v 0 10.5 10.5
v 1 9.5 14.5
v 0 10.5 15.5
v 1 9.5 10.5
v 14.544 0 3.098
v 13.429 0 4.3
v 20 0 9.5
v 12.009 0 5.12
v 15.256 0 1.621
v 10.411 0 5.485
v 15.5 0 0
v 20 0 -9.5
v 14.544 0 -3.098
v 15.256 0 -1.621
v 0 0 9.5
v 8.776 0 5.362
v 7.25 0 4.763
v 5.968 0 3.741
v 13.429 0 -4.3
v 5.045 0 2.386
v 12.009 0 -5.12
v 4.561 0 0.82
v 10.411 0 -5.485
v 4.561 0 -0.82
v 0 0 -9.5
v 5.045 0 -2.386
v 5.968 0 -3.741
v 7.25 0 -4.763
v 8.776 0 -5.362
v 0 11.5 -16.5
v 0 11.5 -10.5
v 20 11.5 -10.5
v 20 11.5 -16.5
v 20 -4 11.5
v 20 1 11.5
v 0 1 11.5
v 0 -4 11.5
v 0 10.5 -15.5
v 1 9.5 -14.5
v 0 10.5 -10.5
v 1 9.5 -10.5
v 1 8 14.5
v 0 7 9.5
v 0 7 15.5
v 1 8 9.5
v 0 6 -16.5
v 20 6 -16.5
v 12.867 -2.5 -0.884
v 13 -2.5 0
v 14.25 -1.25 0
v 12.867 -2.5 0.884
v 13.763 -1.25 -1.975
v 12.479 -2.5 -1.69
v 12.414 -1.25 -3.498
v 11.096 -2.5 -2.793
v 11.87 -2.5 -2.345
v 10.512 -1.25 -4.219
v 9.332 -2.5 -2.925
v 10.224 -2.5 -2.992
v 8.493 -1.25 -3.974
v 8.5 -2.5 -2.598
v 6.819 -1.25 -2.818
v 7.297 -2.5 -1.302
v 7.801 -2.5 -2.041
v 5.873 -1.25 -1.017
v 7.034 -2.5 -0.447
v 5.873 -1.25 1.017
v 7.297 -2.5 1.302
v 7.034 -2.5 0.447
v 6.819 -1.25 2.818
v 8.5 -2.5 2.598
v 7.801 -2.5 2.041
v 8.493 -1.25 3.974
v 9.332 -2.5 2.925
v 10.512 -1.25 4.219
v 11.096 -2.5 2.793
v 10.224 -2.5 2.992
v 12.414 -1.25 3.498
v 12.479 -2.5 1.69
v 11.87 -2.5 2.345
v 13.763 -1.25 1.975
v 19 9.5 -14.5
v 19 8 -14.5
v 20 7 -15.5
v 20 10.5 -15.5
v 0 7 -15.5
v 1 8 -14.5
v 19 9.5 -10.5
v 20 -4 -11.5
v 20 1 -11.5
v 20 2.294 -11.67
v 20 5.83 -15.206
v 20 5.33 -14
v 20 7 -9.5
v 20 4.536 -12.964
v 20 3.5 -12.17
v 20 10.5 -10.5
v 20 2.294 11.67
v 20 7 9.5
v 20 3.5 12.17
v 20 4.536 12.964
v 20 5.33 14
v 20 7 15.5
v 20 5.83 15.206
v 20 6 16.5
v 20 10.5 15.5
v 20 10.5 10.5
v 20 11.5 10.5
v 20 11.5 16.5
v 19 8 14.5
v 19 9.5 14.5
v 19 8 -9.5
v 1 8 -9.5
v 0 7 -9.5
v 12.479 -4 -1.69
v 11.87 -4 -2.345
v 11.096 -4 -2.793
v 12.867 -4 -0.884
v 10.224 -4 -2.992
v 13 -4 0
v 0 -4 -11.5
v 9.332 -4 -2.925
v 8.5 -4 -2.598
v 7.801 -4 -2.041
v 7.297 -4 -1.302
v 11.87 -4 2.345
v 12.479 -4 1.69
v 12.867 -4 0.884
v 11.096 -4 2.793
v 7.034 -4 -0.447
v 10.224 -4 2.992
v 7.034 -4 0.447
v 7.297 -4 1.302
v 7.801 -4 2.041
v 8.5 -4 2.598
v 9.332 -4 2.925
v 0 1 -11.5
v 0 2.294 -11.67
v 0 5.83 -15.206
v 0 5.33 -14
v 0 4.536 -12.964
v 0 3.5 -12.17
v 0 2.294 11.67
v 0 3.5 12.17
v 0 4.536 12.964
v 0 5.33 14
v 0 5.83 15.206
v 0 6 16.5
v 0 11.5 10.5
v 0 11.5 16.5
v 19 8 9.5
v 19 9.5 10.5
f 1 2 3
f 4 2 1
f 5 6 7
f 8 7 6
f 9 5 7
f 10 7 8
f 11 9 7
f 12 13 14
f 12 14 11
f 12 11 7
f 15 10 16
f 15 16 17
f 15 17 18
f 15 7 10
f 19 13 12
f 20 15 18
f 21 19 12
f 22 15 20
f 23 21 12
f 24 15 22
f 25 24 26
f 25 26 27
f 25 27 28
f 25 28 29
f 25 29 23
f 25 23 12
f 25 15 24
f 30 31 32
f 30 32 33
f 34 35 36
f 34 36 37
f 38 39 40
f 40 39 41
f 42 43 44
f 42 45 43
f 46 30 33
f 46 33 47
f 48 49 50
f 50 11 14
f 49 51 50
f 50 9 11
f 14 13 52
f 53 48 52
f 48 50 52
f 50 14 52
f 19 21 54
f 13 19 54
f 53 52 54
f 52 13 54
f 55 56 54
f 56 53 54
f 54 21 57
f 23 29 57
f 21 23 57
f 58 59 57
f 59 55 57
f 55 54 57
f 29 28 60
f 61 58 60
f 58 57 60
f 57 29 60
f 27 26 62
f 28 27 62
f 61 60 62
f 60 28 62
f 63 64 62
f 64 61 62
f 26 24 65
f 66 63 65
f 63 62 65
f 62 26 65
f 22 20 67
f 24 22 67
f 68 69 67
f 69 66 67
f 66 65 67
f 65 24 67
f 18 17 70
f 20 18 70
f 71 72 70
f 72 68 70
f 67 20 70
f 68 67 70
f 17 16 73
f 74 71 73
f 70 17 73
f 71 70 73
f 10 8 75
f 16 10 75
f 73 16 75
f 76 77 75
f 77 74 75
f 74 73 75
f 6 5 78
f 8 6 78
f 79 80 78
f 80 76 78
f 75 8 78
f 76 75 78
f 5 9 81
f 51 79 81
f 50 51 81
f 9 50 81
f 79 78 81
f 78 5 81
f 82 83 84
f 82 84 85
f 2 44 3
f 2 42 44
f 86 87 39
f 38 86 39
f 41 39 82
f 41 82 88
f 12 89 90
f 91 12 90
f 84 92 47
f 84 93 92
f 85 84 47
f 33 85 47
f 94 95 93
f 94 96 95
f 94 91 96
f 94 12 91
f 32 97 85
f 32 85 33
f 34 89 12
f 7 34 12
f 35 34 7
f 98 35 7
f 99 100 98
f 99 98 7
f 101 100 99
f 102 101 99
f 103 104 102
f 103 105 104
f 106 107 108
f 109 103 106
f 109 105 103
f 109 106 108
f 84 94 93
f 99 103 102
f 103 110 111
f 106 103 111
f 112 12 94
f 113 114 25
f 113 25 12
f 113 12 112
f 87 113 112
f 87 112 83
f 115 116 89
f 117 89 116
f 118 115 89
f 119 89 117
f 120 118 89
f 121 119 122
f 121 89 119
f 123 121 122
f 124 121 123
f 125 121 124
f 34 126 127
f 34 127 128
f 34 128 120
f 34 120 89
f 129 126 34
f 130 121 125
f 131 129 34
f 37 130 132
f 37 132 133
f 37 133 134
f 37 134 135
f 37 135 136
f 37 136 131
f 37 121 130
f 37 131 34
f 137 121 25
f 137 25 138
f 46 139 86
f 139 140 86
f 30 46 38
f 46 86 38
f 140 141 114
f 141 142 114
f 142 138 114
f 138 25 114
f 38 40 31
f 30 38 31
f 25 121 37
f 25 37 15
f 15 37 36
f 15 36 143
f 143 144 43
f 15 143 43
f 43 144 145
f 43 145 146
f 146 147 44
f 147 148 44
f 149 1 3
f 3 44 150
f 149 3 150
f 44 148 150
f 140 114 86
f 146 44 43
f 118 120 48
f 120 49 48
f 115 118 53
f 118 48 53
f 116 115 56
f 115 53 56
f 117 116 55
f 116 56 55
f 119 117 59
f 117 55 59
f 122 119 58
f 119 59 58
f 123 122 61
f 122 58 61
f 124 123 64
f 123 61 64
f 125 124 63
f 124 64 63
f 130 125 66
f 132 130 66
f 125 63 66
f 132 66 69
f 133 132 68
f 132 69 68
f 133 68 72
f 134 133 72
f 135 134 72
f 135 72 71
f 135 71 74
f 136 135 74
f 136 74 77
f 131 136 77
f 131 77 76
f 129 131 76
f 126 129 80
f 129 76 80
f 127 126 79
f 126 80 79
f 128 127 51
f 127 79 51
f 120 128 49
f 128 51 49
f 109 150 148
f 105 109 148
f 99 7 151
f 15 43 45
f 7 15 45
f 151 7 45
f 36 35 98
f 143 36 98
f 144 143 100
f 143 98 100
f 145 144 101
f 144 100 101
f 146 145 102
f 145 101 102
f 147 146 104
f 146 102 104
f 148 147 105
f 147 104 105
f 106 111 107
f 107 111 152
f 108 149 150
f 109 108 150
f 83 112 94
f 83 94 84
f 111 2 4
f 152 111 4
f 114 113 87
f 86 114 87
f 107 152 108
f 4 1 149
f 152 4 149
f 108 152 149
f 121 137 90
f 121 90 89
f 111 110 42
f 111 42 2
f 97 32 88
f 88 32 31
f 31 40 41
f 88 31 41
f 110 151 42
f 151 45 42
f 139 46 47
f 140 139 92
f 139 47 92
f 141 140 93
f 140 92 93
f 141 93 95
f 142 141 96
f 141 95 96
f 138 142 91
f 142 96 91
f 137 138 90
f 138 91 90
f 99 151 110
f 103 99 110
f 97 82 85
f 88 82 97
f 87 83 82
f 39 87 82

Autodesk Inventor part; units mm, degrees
ref_plane "YZ Plane" through (0, 0, 0) normal (1, 0, 0) x (0, 1, 0)
ref_plane "XZ Plane" through (0, 0, 0) normal (0, 1, 0) x (-1, 0, 0)
ref_plane "XY Plane" through (0, 0, 0) normal (0, 0, 1) x (1, 0, 0)
sketch "Sketch1" plane through (0, 0, 0) normal (1, 0, 0) x (0, 1, 0)
  line L0 (0, 9.5) -> (0, -9.5)
  line L1 (0, -9.5) -> (8, -9.5)
  line L2 (0, 9.5) -> (8, 9.5)
  line L3 (8, 9.5) -> (8, 14.5)
  line L4 (8, 14.5) -> (9.5, 14.5)
  line L5 (9.5, 14.5) -> (9.5, 10.5)
  line L6 (9.5, 10.5) -> (11.5, 10.5)
  line L7 (11.5, 10.5) -> (11.5, 16.5)
  line L8 (11.5, 16.5) -> (6, 16.5)
  line L9 (6, 16.5) -> (6, 11.5)
  line L10 (6, 11.5) -> (-3, 11.5)
  line L11 (-3, 11.5) -> (-4, 11.5)
  line L12 (-4, 11.5) -> (-4, 1)
  line L13 (0, 0) -> (3.5, 0)
  line L14 (0, -9.5) -> (8, -9.5)
  line L15 (8, -9.5) -> (8, -14.5)
  line L16 (8, -14.5) -> (9.5, -14.5)
  line L17 (9.5, -14.5) -> (9.5, -10.5)
  line L18 (11.5, -10.5) -> (11.5, -16.5)
  line L19 (11.5, -16.5) -> (6, -16.5)
  line L20 (6, -16.5) -> (6, -11.5)
  line L21 (6, -11.5) -> (-3, -11.5)
  line L22 (-3, -11.5) -> (-4, -11.5)
  line L23 (-4, -11.5) -> (-4, 1)
  line L24 (11.5, -10.5) -> (9.5, -10.5)
  point P0 (8.75, -16.5)
  point P1 (8.75, -14.5)
  dimension "d0" = 19
  dimension "d1" = 0
  dimension "d2" = 8
  dimension "d3" = 8
  dimension "d4" = 5
  dimension "d5" = 1.5
  dimension "d6" = 2
  dimension "d7" = 6
  dimension "d8" = 5.5
  dimension "d9" = 5
  dimension "d10" = 1
  dimension "d13" = 2
  dimension "d14" = 4
extrude "Extrusion1" add sketch "Sketch1" along normal blind 20
fillet "Fillet1" radius 5 2 edges at (10, 6, -11.5) (10, 6, 11.5)
chamfer "Chamfer1" distance 1 angle 45 12 edges at (20, 8, -12) (20, 8.75, -14.5) (20, 9.5, -12.5) (20, 8, 12) (20, 8.75, 14.5) (20, 9.5, 12.5) (0, 8, -12) (0, 8.75, -14.5) (0, 9.5, -12.5) (0, 8, 12) (0, 8.75, 14.5) (0, 9.5, 12.5)
sketch "Sketch2" plane through (0, 0, 9.5) normal (0, 1, 0) x (1, 0, 0)
  circle A0 centre (10, 9.5) radius 3
  line L0 (20, 19) -> (20, 0) projected
  line L1 (0, -7) -> (20, -7) projected
  point P0 (0, 9.5)
  dimension "d19" = 6
  dimension "d20" = 10
  dimension "d21" = 16.5
extrude "Extrusion2" cut sketch "Sketch2" against normal blind 20
chamfer "Chamfer2" distance 2.5 angle 45 1 edges at (7, 0, 0)
properties part number "Drziak_1"
